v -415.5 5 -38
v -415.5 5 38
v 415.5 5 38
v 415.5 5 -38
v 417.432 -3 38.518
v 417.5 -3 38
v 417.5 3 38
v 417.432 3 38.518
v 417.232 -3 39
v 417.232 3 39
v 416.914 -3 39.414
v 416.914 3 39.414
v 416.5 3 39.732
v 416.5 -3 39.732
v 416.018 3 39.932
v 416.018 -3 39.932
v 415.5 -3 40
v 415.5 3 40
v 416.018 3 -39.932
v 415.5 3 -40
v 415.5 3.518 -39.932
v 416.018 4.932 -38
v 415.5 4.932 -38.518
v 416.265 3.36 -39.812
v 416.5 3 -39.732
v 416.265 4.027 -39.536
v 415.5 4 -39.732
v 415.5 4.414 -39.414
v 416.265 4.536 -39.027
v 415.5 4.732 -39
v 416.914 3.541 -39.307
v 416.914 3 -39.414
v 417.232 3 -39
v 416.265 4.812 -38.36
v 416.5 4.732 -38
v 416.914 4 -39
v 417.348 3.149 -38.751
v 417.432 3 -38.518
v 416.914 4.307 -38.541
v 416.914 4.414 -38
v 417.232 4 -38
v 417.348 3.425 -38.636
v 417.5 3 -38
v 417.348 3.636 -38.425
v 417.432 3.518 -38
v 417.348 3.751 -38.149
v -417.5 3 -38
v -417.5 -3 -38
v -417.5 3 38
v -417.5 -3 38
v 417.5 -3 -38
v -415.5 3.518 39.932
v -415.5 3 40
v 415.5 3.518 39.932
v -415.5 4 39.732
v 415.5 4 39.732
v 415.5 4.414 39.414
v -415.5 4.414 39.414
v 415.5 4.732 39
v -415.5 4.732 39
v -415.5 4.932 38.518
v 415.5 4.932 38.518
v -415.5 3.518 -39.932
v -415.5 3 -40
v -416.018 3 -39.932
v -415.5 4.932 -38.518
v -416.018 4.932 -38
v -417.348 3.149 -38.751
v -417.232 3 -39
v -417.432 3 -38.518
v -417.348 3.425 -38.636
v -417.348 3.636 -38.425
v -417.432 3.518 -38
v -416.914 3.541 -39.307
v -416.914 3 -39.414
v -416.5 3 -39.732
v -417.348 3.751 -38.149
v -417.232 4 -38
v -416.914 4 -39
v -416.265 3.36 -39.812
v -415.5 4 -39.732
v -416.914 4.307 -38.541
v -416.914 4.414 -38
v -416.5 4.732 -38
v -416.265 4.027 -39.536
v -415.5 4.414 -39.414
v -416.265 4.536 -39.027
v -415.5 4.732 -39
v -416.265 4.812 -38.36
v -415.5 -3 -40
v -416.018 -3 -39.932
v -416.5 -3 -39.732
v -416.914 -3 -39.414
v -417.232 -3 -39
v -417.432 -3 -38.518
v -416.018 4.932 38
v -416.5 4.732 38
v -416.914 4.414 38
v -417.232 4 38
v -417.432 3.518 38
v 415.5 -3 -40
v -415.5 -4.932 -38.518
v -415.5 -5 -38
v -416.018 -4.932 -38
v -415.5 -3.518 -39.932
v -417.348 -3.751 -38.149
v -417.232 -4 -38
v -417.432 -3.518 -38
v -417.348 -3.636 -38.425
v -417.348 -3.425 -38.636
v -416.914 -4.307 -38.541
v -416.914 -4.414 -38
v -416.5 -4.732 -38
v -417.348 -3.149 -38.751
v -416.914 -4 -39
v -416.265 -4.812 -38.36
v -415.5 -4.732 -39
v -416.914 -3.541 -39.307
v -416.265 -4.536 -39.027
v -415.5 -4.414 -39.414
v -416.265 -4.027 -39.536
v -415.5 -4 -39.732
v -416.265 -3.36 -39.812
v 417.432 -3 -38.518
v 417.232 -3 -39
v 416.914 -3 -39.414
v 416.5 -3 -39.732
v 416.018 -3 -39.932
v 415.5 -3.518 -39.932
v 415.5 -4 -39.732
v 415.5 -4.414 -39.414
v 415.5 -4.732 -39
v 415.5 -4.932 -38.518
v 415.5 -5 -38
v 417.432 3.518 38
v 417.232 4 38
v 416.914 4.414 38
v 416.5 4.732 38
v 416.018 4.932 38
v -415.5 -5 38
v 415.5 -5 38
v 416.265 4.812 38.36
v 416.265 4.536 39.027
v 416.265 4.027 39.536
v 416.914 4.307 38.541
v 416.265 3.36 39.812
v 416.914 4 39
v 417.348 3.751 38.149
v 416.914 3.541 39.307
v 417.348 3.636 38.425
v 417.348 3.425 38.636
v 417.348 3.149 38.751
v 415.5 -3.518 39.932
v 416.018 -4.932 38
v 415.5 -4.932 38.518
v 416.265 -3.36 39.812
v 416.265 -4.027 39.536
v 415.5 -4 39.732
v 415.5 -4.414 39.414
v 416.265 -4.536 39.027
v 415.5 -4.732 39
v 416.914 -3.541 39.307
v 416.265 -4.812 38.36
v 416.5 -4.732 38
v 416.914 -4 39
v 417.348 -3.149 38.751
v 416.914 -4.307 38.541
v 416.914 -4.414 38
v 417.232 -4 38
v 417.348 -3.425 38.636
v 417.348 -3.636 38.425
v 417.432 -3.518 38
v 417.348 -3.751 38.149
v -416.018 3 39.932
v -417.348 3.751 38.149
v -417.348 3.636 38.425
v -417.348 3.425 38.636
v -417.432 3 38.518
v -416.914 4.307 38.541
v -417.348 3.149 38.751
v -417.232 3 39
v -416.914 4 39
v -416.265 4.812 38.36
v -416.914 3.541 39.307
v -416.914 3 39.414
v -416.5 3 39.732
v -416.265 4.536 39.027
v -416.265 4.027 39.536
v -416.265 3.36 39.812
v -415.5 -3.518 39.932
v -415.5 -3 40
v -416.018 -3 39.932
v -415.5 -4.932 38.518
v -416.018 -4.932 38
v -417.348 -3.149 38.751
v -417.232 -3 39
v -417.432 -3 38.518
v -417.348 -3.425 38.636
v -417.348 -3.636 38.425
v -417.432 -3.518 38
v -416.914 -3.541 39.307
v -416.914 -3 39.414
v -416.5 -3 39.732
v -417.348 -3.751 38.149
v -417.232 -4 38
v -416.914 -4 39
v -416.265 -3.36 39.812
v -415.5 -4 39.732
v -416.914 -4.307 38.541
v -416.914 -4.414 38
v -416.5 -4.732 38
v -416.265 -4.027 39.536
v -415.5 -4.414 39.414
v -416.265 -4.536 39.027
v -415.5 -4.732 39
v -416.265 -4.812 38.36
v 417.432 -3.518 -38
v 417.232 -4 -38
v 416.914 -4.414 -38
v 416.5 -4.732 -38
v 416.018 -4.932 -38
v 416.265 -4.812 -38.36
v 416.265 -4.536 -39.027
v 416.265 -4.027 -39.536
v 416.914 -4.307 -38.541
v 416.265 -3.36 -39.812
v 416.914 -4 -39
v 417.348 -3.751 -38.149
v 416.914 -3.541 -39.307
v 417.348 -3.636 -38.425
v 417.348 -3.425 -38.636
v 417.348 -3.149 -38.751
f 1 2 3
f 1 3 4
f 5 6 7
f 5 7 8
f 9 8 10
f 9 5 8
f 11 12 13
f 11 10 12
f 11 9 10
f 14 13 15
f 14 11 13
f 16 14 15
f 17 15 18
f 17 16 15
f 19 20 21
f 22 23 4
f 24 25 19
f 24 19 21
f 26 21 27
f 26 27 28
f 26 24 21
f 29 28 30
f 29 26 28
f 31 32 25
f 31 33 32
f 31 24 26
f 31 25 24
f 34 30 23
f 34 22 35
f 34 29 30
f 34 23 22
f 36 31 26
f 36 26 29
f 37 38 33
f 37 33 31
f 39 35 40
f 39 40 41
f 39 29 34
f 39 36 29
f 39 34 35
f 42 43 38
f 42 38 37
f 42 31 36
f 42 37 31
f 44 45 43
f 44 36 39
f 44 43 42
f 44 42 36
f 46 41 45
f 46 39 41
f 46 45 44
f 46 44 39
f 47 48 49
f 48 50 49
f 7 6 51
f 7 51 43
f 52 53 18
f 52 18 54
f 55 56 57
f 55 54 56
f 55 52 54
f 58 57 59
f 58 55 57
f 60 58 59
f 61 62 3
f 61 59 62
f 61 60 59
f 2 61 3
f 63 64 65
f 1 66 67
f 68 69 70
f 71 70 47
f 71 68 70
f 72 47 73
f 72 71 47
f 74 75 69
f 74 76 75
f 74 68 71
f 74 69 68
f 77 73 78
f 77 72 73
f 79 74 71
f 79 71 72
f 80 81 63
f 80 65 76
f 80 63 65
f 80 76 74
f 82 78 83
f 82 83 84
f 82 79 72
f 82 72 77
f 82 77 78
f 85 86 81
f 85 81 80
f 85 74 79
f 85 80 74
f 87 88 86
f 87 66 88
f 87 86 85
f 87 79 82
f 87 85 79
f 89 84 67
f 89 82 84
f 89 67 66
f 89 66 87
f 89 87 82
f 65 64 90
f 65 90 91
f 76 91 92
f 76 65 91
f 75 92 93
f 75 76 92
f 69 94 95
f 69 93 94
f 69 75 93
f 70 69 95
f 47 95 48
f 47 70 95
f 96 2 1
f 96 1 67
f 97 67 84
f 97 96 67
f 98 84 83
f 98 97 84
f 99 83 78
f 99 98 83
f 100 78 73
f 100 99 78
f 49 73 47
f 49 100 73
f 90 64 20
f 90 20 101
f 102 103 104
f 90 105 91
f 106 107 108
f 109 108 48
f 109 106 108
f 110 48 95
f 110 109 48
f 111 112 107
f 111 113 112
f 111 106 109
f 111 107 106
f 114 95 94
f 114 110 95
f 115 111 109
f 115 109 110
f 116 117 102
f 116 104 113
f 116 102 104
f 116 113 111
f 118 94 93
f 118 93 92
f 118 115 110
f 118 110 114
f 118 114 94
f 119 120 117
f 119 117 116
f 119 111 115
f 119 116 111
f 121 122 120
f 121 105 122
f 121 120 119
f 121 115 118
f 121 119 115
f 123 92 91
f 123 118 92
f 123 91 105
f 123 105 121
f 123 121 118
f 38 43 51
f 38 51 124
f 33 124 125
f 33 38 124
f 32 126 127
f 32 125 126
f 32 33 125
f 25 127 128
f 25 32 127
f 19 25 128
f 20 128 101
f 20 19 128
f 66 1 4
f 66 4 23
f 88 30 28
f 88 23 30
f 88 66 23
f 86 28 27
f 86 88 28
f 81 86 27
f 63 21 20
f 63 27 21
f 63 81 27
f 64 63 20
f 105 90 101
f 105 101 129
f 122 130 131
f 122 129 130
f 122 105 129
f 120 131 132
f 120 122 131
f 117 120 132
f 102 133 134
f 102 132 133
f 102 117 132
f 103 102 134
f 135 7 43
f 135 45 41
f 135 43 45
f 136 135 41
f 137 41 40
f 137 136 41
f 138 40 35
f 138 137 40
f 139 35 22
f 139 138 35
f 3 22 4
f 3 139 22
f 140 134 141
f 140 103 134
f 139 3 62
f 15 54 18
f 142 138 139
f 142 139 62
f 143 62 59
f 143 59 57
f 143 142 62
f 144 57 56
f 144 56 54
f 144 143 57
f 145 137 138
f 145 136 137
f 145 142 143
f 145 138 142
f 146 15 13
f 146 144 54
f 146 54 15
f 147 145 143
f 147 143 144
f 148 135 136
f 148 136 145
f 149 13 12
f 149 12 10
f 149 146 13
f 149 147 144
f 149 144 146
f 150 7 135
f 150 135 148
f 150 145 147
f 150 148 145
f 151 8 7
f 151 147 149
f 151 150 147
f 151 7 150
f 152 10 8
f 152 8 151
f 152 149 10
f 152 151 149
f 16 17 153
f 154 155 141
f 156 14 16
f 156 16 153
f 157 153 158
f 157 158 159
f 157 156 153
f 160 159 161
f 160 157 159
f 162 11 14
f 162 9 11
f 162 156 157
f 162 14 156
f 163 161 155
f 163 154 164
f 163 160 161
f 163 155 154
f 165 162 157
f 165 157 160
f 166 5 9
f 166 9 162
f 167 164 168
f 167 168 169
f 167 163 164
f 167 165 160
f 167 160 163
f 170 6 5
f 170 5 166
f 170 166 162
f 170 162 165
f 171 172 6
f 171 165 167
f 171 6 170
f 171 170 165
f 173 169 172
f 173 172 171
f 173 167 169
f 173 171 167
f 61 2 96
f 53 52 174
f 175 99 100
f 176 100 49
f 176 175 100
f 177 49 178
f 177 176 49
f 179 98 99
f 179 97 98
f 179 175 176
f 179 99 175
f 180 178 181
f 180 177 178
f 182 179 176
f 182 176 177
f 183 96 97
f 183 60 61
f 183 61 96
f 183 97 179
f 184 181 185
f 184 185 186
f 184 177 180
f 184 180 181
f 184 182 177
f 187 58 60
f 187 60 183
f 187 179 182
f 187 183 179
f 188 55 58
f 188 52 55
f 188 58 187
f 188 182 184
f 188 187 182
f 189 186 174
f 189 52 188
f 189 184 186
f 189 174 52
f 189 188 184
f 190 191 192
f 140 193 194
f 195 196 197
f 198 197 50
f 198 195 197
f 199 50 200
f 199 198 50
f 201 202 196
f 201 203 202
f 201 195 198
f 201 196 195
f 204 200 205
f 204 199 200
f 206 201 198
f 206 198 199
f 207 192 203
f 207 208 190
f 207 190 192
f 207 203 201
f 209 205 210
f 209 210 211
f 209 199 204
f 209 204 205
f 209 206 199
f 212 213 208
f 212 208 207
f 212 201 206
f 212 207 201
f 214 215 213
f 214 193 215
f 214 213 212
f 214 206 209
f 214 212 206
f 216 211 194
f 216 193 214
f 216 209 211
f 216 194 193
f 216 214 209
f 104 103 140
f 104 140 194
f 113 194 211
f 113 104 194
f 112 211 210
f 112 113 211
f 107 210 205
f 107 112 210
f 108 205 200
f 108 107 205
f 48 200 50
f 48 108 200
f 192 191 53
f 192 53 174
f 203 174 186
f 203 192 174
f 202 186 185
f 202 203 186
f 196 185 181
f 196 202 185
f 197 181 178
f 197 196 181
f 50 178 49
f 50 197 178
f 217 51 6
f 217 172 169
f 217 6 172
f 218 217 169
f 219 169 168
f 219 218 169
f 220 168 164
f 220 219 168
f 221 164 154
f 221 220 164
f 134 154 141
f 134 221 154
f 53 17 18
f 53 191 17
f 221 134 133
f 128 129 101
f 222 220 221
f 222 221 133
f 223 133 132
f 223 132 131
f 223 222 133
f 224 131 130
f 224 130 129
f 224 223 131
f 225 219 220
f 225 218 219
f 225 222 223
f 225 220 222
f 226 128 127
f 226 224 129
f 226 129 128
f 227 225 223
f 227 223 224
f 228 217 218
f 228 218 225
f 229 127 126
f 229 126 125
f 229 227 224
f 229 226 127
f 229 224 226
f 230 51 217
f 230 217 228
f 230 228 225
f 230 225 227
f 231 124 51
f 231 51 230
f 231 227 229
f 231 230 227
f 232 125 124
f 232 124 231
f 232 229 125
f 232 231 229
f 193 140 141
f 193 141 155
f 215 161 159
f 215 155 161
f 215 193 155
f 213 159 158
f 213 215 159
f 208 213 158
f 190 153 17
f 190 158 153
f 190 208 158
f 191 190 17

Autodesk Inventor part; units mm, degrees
ref_plane "YZ Plane" through (0, 0, 0) normal (1, 0, 0) x (0, 1, 0)
ref_plane "XZ Plane" through (0, 0, 0) normal (0, 1, 0) x (-1, 0, 0)
ref_plane "XY Plane" through (0, 0, 0) normal (0, 0, 1) x (1, 0, 0)
sketch "Sketch1" plane through (0, 0, 0) normal (1, 0, 0) x (0, 1, 0)
  line L0 (-3, 40) -> (3, 40)
  line L1 (5, 38) -> (5, -38)
  line L2 (3, -40) -> (-3, -40)
  line L3 (-5, -38) -> (-5, 38)
  line L4 (-5, 40) -> (5, -40) construction
  line L5 (5, 40) -> (-5, -40) construction
  arc A0 (5, 38) -> (3, 40) centre (3, 38) ccw
  arc A1 (-3, 40) -> (-5, 38) centre (-3, 38) ccw
  arc A2 (3, -40) -> (5, -38) centre (3, -38) ccw
  arc A3 (-5, -38) -> (-3, -40) centre (-3, -38) ccw
  point P0 (0, 0)
  dimension "d0" = 10
  dimension "d1" = 80
  dimension "d2" = 2
extrude "Extrusion1" add sketch "Sketch1" along normal blind 417.5 and the other way blind 417.5
fillet "Fillet1" radius 2 8 edges at (417.5, 4.4142, 39.4142) (417.5, 0, 40) (417.5, -4.4142, 39.4142) (417.5, -5, 0) (417.5, -4.4142, -39.4142) (417.5, 0, -40) (417.5, 4.4142, -39.4142) (417.5, 5, 0)
fillet "Fillet2" radius 2 8 edges at (-417.5, 4.4142, -39.4142) (-417.5, 0, -40) (-417.5, -4.4142, -39.4142) (-417.5, -5, 0) (-417.5, -4.4142, 39.4142) (-417.5, 0, 40) (-417.5, 4.4142, 39.4142) (-417.5, 5, 0)
properties part number "CeramicModel"
